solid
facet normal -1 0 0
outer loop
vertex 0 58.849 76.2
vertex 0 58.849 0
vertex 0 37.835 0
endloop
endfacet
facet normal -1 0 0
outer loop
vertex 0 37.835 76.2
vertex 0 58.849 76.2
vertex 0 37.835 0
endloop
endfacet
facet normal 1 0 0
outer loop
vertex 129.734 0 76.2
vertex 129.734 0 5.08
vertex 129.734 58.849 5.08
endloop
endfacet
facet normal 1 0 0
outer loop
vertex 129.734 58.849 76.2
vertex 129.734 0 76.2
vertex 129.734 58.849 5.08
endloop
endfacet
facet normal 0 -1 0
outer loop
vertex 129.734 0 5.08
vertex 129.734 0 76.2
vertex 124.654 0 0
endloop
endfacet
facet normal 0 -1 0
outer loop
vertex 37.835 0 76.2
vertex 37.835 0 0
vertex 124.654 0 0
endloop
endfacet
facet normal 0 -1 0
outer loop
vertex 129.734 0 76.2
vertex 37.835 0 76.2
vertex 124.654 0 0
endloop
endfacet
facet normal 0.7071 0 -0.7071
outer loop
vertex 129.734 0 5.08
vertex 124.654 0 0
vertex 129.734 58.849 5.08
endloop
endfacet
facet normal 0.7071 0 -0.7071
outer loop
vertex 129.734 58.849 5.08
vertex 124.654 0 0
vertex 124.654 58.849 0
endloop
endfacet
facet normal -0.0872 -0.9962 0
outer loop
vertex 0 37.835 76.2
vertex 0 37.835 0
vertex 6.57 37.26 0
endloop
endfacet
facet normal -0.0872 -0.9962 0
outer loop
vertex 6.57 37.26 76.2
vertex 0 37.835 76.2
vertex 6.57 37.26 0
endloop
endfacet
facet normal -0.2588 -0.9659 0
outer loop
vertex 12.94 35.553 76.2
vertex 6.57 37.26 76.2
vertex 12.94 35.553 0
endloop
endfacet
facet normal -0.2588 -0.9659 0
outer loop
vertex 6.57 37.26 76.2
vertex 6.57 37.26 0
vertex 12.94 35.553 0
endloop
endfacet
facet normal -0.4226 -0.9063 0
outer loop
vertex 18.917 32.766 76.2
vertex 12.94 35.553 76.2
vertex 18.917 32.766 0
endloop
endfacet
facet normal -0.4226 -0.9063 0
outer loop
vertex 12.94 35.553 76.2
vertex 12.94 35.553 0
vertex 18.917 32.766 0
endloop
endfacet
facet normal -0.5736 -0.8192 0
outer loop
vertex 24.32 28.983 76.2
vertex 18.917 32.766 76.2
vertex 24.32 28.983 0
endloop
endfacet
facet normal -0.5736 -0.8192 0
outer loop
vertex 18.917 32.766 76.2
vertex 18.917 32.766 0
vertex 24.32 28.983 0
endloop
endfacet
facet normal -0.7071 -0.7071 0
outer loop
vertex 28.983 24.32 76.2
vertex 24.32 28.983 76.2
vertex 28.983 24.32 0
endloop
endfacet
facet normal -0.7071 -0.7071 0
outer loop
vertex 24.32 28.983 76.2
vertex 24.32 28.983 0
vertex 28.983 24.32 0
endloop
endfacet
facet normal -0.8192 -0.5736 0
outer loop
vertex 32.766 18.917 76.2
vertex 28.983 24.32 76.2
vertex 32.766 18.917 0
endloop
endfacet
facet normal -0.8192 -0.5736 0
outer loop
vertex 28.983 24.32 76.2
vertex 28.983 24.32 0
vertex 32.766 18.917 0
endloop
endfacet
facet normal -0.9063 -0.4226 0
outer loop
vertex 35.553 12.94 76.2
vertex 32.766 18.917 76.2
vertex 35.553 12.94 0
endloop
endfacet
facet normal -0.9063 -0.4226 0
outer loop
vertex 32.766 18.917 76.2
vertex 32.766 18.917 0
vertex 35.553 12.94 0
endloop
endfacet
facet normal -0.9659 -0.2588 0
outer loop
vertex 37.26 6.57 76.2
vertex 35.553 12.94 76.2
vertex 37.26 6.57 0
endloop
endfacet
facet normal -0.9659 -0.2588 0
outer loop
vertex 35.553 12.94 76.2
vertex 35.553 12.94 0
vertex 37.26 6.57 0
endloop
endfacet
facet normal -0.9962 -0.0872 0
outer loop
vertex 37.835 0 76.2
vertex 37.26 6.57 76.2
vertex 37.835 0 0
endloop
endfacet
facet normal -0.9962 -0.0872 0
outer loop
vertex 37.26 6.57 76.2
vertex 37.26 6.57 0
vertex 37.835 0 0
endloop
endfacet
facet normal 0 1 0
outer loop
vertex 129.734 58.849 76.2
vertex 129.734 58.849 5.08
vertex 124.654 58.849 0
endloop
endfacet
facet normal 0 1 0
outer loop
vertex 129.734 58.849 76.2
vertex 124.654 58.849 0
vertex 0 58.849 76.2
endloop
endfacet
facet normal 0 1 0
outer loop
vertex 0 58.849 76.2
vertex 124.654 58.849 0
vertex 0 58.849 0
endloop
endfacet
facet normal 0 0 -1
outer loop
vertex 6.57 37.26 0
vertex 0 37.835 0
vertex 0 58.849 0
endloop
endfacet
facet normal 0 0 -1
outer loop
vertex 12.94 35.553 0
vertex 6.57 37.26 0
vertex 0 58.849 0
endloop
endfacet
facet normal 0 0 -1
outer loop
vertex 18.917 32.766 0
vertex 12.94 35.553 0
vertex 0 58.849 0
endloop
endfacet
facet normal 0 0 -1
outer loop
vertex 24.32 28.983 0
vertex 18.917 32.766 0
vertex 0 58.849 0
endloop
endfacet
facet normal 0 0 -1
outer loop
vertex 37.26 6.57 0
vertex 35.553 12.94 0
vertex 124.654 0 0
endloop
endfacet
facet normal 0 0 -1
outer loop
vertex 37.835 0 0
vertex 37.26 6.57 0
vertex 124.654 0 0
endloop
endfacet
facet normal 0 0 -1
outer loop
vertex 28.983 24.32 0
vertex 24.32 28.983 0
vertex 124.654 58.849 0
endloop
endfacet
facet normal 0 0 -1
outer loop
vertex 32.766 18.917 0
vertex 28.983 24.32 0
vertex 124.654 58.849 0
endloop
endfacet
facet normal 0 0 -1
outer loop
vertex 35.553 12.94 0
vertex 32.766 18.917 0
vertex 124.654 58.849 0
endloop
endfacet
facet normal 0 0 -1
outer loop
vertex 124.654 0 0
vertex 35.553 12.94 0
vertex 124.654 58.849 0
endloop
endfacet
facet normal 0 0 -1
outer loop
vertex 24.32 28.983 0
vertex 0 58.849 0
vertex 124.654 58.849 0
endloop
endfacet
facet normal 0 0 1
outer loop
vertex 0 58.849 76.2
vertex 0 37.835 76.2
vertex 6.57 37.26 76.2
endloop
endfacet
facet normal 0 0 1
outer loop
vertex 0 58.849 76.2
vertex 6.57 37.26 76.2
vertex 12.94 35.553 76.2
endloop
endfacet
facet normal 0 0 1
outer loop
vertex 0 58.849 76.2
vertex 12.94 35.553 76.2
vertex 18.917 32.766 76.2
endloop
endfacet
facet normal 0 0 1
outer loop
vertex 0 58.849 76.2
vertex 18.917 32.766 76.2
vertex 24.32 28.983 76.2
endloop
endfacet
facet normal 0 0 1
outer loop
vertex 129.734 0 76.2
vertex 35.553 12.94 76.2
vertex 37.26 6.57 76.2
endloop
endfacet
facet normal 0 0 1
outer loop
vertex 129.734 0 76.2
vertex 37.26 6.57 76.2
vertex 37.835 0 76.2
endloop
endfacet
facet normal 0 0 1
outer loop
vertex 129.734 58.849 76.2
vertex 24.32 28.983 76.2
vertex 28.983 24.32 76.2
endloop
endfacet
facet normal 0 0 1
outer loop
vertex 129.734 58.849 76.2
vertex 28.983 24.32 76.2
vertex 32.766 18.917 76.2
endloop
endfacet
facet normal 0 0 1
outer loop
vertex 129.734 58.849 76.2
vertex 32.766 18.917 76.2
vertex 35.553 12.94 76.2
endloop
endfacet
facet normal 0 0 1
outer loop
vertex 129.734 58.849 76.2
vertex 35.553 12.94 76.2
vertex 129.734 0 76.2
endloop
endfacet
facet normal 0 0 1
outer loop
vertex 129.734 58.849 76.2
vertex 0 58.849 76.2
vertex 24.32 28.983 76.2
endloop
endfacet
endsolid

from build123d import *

# Parameters (mm, degrees)
F1_DEPTH = 76.2
F3_SIZE  = 5.08


# Not quite as in the source:
# - the program builds the solid bodies; features that only make, move or delete a surface that nothing else refers to are left out


with BuildPart() as f1:
    # F0 (on Top) → F1 (new body)
    with BuildSketch(Plane.XY):
        with BuildLine():
            ThreePointArc((0, 37.8345108272), (26.7530391688, 26.7530391688), (37.8345108272, 0))
            Line((37.8345108272, 0), (129.7342181206, 0))
            Line((129.7342181206, 0), (129.7342181206, 58.8485188782))
            Line((129.7342181206, 58.8485188782), (0, 58.8485188782))
            Line((0, 58.8485188782), (0, 37.8345108272))
        make_face()
    extrude(amount=F1_DEPTH)

    # F3
    f3_edges = [f1.edges().sort_by_distance(p)[0] for p in [
        (129.734218, 29.424259, 0),
    ]]
    chamfer(f3_edges, length=F3_SIZE)


solid = f1.part
